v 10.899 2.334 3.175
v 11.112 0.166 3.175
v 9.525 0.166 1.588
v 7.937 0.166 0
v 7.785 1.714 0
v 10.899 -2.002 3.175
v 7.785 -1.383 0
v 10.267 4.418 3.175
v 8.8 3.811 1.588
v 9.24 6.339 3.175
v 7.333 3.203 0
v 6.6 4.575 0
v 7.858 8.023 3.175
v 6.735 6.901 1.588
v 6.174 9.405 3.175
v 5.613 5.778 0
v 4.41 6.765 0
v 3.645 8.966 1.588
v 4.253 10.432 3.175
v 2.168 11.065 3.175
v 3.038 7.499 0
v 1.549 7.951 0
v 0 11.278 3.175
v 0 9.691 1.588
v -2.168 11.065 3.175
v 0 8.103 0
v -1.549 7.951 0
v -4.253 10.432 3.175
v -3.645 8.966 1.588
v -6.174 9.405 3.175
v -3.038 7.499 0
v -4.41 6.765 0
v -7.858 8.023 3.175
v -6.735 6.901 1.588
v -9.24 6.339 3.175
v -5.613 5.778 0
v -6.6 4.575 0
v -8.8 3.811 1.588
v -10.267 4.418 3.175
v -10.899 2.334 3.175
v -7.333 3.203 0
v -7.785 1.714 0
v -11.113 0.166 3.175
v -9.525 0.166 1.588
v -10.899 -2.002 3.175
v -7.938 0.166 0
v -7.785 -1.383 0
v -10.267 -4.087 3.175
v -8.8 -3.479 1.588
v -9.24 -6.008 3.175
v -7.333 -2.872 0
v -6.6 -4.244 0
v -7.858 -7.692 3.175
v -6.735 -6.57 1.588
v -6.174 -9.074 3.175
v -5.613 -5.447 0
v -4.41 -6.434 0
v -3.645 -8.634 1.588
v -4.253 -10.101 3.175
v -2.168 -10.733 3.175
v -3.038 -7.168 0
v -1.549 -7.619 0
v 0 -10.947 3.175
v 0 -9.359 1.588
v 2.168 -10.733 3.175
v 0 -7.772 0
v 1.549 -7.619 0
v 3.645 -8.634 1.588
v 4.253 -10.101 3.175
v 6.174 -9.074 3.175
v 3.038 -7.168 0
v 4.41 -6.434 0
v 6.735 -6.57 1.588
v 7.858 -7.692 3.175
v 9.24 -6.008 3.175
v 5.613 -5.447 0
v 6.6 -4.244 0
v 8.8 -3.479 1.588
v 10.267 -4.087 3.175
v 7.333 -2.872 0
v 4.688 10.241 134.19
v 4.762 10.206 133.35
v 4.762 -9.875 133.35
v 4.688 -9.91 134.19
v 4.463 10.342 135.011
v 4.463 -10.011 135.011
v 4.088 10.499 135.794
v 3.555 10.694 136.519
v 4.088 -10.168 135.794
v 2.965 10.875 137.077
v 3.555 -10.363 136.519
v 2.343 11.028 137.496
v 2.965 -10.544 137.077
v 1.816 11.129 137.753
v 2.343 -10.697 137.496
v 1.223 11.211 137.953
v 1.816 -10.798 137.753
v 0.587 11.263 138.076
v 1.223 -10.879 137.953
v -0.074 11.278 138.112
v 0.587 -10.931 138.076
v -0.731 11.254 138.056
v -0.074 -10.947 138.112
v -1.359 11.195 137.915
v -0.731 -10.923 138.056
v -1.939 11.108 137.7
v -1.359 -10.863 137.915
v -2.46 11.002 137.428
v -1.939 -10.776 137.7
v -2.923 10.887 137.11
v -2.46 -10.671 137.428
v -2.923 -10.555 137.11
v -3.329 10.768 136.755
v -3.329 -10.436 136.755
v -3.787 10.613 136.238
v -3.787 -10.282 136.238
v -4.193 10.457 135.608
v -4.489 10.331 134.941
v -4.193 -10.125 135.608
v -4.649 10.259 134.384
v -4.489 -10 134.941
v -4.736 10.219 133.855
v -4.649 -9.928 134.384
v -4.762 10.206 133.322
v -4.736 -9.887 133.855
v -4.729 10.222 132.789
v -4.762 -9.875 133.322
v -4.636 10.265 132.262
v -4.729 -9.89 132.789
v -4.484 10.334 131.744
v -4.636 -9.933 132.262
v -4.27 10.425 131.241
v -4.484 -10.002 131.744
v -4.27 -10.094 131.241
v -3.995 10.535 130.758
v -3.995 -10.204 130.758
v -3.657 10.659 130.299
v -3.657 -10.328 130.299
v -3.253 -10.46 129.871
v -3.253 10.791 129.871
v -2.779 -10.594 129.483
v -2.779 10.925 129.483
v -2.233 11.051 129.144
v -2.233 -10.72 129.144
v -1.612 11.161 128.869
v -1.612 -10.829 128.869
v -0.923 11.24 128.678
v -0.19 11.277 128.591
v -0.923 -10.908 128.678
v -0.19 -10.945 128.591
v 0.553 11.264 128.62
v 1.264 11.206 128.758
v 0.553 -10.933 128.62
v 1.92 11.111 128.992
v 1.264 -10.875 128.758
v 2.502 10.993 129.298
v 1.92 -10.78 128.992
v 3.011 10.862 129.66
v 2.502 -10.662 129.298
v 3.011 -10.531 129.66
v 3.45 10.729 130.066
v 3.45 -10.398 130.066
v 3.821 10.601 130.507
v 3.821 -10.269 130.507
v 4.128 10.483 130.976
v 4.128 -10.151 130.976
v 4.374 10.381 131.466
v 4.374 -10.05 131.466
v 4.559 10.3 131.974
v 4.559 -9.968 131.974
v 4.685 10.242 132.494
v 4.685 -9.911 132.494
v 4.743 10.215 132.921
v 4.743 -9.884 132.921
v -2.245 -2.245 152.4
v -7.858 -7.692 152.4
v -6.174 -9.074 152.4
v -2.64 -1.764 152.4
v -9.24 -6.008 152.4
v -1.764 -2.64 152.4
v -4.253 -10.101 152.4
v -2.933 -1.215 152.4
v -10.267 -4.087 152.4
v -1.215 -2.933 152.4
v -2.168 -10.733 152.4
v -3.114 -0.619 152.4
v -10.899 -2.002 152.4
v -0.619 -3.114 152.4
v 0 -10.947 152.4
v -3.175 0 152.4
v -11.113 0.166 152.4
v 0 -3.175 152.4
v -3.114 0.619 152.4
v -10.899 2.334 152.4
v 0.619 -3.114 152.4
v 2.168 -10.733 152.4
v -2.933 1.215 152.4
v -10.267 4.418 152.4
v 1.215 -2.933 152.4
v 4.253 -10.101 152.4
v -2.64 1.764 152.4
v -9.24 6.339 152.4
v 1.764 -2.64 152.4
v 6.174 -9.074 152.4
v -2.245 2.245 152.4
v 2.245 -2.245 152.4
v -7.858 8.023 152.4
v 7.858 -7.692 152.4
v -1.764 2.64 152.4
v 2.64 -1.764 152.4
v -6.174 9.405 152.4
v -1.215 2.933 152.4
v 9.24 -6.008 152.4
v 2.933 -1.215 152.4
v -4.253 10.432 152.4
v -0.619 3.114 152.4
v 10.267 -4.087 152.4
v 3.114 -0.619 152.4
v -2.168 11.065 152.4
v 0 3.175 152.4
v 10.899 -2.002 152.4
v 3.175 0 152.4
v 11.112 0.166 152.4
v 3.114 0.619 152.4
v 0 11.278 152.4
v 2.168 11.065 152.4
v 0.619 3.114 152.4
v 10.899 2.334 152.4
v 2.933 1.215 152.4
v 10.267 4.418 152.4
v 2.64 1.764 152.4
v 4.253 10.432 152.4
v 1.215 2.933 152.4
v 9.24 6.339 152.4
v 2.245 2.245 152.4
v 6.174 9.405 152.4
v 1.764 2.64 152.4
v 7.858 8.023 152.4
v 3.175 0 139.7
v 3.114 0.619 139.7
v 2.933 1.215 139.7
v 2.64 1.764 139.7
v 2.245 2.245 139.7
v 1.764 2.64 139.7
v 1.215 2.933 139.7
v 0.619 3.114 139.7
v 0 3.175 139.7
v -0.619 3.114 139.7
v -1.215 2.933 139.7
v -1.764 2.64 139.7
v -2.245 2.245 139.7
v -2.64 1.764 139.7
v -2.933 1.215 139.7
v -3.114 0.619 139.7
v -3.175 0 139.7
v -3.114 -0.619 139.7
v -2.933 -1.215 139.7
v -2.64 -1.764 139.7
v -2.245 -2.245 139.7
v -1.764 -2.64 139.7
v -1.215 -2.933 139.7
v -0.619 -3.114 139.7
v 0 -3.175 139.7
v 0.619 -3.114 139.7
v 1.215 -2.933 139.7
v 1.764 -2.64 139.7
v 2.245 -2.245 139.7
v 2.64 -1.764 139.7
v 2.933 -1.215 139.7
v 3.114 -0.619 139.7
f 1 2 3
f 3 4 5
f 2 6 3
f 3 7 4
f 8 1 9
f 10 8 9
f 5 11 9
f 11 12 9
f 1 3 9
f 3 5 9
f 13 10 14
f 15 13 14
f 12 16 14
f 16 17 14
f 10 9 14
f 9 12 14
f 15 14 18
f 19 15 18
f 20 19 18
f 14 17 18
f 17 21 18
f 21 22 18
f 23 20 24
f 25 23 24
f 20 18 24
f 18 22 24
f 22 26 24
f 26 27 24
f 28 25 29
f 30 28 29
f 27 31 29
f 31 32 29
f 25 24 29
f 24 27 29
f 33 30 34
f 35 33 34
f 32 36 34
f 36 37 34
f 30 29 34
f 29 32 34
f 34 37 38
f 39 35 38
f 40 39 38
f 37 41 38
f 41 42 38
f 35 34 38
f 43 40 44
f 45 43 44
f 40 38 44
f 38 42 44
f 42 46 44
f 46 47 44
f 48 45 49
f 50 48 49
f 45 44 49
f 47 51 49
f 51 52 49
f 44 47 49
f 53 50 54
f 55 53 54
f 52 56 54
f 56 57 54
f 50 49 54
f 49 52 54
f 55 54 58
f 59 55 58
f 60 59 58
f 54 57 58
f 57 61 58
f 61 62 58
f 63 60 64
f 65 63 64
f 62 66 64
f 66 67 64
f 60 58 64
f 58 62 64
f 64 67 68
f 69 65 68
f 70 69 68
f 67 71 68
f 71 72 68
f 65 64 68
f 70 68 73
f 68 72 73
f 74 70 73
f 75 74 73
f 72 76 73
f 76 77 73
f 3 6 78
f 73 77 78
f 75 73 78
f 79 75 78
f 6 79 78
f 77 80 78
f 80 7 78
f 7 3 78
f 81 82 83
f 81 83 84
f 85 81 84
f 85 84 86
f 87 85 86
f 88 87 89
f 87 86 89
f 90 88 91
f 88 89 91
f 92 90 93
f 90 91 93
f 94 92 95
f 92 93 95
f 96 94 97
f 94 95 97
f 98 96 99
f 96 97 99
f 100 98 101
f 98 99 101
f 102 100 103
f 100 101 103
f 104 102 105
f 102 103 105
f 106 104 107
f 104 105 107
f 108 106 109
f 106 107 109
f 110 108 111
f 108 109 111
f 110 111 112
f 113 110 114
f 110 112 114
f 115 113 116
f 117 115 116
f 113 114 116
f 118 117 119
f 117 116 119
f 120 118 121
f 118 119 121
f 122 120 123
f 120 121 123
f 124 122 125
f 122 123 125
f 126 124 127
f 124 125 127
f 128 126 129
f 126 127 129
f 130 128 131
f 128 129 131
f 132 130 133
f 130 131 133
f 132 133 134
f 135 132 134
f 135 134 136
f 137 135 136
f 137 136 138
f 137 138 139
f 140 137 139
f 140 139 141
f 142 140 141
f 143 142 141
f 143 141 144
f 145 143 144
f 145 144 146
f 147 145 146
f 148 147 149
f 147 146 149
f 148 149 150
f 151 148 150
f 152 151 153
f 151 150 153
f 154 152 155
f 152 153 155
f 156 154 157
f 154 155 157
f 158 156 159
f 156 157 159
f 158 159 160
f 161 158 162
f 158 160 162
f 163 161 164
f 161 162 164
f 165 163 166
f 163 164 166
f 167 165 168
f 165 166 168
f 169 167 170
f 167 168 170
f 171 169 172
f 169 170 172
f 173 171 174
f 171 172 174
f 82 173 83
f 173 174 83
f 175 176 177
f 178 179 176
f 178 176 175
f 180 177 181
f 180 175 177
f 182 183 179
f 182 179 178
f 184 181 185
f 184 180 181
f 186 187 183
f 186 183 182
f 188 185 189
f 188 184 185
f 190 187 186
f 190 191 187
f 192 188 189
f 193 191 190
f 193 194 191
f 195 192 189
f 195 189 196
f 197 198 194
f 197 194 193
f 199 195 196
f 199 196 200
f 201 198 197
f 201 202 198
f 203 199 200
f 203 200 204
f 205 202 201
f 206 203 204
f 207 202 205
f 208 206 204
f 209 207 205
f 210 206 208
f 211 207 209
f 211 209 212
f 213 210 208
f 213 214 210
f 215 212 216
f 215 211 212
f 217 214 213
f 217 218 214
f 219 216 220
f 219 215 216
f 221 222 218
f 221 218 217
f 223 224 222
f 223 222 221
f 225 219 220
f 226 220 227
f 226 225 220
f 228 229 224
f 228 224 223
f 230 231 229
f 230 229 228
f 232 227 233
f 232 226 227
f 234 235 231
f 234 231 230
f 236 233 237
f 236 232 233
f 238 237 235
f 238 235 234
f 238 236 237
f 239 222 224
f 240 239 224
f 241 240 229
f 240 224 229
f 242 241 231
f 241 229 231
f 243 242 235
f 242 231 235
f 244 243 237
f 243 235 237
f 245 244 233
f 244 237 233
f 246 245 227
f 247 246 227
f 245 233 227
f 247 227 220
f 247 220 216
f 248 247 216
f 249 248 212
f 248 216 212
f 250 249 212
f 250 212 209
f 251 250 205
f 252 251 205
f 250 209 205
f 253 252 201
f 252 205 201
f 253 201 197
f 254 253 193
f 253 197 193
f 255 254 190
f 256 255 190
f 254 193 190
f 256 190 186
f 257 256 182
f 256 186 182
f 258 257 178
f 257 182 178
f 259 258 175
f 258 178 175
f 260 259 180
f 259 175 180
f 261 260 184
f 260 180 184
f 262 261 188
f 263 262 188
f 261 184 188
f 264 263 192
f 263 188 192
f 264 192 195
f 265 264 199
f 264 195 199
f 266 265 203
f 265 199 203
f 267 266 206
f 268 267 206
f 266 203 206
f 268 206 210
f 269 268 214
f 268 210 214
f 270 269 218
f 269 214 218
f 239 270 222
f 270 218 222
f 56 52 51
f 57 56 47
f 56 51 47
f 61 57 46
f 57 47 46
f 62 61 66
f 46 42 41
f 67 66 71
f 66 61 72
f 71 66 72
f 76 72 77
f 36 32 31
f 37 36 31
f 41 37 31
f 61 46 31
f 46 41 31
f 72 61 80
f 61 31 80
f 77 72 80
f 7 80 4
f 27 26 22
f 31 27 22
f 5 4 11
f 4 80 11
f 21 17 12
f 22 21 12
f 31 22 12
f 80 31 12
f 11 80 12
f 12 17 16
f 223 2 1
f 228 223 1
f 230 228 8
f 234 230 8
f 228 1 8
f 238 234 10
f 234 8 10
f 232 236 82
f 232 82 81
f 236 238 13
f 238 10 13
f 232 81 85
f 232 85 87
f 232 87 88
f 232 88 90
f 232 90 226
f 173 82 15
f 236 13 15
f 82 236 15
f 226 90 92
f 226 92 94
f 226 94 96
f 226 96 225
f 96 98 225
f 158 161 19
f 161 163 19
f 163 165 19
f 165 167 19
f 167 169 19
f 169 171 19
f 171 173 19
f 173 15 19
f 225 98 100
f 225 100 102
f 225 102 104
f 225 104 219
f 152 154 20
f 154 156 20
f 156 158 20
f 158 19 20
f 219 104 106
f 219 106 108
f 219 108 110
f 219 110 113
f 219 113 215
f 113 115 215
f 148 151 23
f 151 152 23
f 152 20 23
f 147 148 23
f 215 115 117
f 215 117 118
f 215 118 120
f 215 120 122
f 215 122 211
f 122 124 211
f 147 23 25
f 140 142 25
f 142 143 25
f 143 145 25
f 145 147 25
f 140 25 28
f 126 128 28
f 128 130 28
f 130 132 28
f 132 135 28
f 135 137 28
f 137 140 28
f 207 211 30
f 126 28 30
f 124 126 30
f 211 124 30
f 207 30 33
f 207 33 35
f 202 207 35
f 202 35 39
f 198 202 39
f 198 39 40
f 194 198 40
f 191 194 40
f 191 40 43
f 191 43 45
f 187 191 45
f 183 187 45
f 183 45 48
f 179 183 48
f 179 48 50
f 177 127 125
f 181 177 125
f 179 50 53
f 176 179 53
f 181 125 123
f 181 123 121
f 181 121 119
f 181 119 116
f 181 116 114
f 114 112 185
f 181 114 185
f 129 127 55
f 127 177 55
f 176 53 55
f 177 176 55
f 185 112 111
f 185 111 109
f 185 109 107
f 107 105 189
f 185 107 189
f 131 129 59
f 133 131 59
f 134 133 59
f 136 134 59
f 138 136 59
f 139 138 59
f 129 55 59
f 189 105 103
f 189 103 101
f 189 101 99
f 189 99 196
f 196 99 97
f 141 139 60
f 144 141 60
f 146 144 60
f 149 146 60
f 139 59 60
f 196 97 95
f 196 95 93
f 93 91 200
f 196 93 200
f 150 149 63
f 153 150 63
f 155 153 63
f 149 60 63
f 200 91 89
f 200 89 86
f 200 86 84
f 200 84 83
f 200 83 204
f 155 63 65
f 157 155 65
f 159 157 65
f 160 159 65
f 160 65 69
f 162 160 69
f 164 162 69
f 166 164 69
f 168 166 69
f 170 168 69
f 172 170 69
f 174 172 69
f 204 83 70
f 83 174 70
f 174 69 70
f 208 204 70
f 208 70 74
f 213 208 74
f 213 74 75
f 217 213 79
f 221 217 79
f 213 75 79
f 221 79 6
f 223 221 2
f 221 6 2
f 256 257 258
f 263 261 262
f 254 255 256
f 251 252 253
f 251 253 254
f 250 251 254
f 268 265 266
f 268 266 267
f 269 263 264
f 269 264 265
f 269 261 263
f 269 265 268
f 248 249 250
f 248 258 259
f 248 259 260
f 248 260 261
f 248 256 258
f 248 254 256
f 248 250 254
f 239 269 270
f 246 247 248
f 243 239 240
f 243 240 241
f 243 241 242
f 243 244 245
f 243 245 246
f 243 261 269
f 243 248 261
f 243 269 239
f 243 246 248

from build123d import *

# Parameters (mm, degrees)
F0_R          = 11.1125
F1_DEPTH      = 152.4
F2_SIZE       = 3.175
F3_R          = 4.7625
F4_DEPTH      = 25.4
F4_DEPTH_BACK = 25.4
F5_R          = 3.175
F6_DEPTH      = 12.7


with BuildPart() as f1:
    # F0 (on Top) → F1 (new body)
    with BuildSketch(Plane.XY):
        with Locations((-1.1552e-06, 0.1656521781)):
            Circle(F0_R)
    extrude(amount=F1_DEPTH)

    # F2
    f2_edges = [f1.edges().sort_by_distance(p)[0] for p in [
        (-11.112501, 0.165652, 0),
    ]]
    chamfer(f2_edges, length=F2_SIZE)

    # F3 (on Front) → F4 (cut, two sides)
    with BuildSketch(Plane.XZ) as f4_sk:
        with Locations((0, 133.35)):
            Circle(F3_R)
    extrude(amount=-F4_DEPTH, mode=Mode.SUBTRACT)
    extrude(f4_sk.sketch, amount=F4_DEPTH_BACK, mode=Mode.SUBTRACT)

    # F5 (on face) → F6 (cut)
    with BuildSketch(Plane.XY.offset(152.4)):
        Circle(F5_R)
    extrude(amount=-F6_DEPTH, mode=Mode.SUBTRACT)


solid = f1.part
